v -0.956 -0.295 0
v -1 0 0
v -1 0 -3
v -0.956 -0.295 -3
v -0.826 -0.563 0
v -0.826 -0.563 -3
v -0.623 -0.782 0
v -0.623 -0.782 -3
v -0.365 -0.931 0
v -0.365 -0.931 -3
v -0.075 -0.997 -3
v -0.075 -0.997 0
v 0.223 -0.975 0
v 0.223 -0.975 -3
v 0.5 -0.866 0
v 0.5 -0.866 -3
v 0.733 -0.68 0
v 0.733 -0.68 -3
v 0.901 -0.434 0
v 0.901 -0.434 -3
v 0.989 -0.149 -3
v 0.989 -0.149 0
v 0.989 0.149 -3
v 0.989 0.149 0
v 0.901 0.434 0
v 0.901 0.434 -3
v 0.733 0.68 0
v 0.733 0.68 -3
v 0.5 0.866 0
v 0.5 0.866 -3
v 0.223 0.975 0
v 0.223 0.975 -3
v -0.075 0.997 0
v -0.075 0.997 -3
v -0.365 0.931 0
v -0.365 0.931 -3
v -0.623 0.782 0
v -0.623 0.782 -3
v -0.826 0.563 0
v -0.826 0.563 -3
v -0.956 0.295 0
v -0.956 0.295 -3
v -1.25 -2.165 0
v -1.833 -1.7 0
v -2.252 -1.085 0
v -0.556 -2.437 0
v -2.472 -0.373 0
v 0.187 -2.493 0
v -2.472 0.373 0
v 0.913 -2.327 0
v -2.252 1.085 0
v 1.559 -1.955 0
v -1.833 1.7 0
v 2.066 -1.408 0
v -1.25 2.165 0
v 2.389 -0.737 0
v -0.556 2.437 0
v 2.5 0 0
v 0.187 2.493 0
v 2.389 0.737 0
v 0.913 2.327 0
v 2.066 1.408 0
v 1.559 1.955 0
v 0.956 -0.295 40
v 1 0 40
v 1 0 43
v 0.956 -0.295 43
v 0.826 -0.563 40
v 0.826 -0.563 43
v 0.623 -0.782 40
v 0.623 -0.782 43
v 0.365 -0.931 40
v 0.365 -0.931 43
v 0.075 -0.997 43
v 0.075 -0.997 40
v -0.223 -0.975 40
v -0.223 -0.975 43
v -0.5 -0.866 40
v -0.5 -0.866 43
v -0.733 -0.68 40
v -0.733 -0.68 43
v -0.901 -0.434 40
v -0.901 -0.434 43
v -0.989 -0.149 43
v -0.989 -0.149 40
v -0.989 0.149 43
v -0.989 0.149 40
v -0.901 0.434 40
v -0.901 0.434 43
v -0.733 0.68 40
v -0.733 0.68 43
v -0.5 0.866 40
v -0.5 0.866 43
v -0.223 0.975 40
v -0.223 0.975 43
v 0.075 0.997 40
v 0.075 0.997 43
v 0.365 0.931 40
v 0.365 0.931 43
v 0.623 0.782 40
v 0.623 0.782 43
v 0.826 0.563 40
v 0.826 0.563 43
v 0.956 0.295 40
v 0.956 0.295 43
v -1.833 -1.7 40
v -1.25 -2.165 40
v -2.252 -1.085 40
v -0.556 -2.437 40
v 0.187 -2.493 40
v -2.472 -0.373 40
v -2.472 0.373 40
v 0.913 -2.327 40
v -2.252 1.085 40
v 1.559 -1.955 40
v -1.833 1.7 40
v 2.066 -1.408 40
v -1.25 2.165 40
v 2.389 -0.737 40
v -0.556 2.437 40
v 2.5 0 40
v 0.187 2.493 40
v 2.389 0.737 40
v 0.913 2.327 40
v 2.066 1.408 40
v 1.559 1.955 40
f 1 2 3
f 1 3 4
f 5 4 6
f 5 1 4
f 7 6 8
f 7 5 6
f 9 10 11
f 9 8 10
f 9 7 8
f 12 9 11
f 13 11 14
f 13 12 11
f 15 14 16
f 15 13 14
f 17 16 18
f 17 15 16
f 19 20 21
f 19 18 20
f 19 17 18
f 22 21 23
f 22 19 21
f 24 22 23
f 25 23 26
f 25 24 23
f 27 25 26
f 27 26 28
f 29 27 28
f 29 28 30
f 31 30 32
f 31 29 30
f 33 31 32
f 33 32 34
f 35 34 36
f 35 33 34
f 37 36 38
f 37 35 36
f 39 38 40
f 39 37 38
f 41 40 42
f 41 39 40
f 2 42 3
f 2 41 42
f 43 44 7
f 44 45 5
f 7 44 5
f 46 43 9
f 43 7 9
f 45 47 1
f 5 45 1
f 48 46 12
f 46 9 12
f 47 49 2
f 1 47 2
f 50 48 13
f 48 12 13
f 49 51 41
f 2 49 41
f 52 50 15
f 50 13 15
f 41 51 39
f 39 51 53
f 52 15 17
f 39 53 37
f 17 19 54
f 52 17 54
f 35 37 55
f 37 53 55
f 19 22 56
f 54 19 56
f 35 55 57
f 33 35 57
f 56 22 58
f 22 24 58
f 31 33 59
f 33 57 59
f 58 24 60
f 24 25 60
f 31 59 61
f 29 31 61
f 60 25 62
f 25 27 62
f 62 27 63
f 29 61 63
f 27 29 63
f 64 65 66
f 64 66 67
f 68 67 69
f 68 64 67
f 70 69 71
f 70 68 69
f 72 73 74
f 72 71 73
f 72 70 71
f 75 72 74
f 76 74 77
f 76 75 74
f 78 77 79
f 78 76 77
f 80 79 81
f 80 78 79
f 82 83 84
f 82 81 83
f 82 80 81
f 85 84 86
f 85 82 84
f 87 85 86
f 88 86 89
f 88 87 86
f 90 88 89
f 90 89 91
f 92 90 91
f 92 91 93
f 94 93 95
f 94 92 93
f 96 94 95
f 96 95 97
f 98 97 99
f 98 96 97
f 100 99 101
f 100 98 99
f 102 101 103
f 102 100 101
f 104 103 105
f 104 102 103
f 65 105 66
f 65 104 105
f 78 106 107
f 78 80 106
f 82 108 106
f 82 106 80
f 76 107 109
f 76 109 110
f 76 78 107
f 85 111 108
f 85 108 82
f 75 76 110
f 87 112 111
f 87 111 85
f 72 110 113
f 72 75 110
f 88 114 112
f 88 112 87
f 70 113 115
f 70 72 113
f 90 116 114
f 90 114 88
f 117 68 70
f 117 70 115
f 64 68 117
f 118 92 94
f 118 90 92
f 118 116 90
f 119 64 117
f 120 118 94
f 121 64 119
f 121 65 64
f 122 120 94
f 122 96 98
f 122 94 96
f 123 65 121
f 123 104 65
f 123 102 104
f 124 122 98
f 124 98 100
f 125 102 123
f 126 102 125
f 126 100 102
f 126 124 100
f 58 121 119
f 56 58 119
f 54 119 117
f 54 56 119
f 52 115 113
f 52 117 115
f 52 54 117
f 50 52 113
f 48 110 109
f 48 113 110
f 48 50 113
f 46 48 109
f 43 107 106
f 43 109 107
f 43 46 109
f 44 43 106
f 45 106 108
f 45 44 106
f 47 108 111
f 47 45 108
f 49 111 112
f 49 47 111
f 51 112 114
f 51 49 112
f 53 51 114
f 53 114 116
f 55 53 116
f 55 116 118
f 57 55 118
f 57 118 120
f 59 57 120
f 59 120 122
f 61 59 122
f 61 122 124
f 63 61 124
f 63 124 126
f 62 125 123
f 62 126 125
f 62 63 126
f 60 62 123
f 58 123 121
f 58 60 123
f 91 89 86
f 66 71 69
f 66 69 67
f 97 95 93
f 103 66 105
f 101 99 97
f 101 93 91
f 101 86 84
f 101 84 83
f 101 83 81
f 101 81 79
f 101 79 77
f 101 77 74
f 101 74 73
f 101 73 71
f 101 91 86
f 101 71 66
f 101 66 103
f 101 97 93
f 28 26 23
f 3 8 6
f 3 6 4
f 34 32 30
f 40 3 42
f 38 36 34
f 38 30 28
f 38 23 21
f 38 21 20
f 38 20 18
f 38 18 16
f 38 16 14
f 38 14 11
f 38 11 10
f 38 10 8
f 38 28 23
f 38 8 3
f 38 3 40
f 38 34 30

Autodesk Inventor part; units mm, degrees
ref_plane "YZ Plane" through (0, 0, 0) normal (1, 0, 0) x (0, 1, 0)
ref_plane "XZ Plane" through (0, 0, 0) normal (0, 1, 0) x (-1, 0, 0)
ref_plane "XY Plane" through (0, 0, 0) normal (0, 0, 1) x (1, 0, 0)
sketch "Sketch1" plane through (0, 0, 0) normal (0, 0, 1) x (1, 0, 0)
  circle A0 centre (0, 0) radius 2.5
  dimension "d0" = 5
extrude "Extrusion1" add sketch "Sketch1" along normal blind 40
sketch "Sketch2" plane through (0, 0, 40) normal (0, 0, 1) x (1, 0, 0)
  circle A0 centre (0, 0) radius 2.5 projected
  circle A1 centre (0, 0) radius 1
  dimension "d3" = 2
extrude "Extrusion2" add sketch "Sketch2" along normal blind 3 contours A1
sketch "Sketch3" plane through (0, 0, 0) normal (0, 0, -1) x (-1, 0, 0)
  circle A0 centre (0, 0) radius 1
  dimension "d6" = 2
extrude "Extrusion3" add sketch "Sketch3" along normal blind 3
properties part number "Bone-4cm"
